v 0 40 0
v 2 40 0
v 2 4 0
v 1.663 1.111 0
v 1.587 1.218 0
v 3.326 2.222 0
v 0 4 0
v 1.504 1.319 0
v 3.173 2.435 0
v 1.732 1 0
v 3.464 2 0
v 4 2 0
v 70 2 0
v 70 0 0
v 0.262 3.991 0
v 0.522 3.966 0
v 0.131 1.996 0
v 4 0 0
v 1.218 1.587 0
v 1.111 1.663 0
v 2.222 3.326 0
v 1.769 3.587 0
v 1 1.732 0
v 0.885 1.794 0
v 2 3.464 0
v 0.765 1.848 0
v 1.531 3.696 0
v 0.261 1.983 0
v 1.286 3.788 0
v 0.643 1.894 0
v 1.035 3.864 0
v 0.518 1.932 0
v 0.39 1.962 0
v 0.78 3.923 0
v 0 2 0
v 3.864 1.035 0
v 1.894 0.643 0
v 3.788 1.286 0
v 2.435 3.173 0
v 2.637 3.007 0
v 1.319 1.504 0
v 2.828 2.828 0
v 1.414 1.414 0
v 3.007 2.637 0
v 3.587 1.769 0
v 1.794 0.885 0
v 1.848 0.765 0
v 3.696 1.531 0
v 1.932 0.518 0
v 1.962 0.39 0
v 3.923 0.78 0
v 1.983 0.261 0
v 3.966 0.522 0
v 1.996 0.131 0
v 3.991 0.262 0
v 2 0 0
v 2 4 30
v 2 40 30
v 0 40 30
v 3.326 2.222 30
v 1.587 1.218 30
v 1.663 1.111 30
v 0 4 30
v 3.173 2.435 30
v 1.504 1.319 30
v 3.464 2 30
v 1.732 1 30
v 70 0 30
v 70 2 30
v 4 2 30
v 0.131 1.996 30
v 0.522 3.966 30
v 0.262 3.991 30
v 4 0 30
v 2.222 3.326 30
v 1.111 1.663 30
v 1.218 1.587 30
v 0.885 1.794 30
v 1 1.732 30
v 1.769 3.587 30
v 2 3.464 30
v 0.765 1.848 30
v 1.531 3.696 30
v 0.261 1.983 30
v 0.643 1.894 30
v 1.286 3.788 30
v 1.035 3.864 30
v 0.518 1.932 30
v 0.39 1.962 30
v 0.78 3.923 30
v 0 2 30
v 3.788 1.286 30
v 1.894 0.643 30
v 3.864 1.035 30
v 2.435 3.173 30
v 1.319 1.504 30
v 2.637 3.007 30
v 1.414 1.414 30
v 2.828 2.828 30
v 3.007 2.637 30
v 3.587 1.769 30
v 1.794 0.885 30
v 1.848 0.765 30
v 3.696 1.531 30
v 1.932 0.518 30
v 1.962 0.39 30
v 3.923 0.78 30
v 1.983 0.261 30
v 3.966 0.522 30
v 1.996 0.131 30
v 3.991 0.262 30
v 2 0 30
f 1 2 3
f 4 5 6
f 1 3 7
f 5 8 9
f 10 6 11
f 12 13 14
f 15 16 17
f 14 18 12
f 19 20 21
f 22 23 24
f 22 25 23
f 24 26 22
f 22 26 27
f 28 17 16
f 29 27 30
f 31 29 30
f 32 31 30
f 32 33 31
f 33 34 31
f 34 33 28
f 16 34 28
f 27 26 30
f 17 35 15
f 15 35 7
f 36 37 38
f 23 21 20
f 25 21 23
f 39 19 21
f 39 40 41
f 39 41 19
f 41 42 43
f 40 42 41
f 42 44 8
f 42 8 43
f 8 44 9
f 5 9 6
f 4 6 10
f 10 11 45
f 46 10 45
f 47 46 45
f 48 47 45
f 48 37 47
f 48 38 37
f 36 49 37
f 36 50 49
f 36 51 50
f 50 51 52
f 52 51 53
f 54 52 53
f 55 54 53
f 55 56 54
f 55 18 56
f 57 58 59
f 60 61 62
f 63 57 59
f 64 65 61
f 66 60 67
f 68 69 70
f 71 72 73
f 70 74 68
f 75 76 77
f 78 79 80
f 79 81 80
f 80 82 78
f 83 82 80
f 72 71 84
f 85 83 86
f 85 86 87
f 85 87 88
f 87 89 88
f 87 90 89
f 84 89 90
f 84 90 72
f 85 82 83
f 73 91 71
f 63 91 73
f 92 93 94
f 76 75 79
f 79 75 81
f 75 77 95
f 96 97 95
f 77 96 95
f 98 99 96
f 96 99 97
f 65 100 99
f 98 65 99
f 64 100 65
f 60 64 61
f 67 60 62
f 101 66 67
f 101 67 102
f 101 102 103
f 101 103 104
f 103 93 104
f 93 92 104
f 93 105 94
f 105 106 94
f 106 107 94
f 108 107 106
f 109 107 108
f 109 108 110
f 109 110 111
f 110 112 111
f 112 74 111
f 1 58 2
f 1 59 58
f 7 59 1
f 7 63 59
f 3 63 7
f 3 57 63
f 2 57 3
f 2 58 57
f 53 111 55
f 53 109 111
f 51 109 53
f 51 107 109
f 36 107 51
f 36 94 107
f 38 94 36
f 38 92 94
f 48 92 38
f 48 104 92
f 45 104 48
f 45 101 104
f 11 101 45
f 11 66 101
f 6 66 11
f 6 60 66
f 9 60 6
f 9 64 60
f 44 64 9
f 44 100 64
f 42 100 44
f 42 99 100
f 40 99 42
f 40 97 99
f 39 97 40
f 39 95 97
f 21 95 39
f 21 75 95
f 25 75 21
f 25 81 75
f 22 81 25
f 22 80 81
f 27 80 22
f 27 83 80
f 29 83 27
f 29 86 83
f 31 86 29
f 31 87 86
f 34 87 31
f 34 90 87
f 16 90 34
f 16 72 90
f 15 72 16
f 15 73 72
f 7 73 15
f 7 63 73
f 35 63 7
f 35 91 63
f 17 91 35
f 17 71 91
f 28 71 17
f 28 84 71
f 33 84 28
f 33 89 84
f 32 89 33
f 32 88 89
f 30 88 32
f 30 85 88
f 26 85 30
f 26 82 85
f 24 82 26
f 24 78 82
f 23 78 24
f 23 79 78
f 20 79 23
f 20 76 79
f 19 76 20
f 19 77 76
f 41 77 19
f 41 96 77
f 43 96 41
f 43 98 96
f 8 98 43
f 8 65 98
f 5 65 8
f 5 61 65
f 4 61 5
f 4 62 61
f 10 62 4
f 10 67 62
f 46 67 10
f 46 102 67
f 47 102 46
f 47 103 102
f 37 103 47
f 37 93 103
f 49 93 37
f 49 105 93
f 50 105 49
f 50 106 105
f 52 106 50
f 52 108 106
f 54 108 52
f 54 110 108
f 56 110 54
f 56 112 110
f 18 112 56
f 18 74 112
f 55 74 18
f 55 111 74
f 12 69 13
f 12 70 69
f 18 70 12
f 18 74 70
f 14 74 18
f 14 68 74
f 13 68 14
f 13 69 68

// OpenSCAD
// Units: mm
$fn = 96;

thickness_mm = 2.0;
bend_radius_mm = 2.0;
k_factor = 0.45;
bend_angle_deg = 90.0;

outside_flange_A_mm = 70.0;
outside_flange_B_mm = 40.0;
width_mm = 30.0;

neutral_radius_mm = bend_radius_mm + k_factor * thickness_mm;
bend_allowance_mm = PI * neutral_radius_mm * bend_angle_deg / 180.0;
outside_setback_mm = (bend_radius_mm + thickness_mm) * tan(bend_angle_deg / 2.0);
bend_deduction_mm = 2.0 * outside_setback_mm - bend_allowance_mm;
developed_flat_length_mm = outside_flange_A_mm + outside_flange_B_mm - bend_deduction_mm;

echo(str(
    "MAKERBENCH-SHEETMETAL: {",
    "\"thickness_mm\":", thickness_mm, ",",
    "\"bend_radius_mm\":", bend_radius_mm, ",",
    "\"developed_flat_length_mm\":", developed_flat_length_mm,
    "}"
));

module formed_l_bracket() {
    r_i = bend_radius_mm;
    r_o = bend_radius_mm + thickness_mm;
    a_straight = outside_flange_A_mm - r_o;
    b_straight = outside_flange_B_mm - r_o;

    linear_extrude(height = width_mm, center = false, convexity = 10)
        union() {
            // Flange A straight leg, tangent to bend outer radius.
            translate([r_o, 0])
                square([a_straight, thickness_mm], center = false);

            // Flange B straight leg, tangent to bend outer radius.
            translate([0, r_o])
                square([thickness_mm, b_straight], center = false);

            // Constant-gauge 90-degree bend: annular quarter sector.
            difference() {
                circle(r = r_o);
                circle(r = r_i);
                translate([-r_o - 1, -r_o - 1])
                    square([r_o + 1, 2 * r_o + 2], center = false);
                translate([-r_o - 1, -r_o - 1])
                    square([2 * r_o + 2, r_o + 1], center = false);
            }
        }
}

formed_l_bracket();
